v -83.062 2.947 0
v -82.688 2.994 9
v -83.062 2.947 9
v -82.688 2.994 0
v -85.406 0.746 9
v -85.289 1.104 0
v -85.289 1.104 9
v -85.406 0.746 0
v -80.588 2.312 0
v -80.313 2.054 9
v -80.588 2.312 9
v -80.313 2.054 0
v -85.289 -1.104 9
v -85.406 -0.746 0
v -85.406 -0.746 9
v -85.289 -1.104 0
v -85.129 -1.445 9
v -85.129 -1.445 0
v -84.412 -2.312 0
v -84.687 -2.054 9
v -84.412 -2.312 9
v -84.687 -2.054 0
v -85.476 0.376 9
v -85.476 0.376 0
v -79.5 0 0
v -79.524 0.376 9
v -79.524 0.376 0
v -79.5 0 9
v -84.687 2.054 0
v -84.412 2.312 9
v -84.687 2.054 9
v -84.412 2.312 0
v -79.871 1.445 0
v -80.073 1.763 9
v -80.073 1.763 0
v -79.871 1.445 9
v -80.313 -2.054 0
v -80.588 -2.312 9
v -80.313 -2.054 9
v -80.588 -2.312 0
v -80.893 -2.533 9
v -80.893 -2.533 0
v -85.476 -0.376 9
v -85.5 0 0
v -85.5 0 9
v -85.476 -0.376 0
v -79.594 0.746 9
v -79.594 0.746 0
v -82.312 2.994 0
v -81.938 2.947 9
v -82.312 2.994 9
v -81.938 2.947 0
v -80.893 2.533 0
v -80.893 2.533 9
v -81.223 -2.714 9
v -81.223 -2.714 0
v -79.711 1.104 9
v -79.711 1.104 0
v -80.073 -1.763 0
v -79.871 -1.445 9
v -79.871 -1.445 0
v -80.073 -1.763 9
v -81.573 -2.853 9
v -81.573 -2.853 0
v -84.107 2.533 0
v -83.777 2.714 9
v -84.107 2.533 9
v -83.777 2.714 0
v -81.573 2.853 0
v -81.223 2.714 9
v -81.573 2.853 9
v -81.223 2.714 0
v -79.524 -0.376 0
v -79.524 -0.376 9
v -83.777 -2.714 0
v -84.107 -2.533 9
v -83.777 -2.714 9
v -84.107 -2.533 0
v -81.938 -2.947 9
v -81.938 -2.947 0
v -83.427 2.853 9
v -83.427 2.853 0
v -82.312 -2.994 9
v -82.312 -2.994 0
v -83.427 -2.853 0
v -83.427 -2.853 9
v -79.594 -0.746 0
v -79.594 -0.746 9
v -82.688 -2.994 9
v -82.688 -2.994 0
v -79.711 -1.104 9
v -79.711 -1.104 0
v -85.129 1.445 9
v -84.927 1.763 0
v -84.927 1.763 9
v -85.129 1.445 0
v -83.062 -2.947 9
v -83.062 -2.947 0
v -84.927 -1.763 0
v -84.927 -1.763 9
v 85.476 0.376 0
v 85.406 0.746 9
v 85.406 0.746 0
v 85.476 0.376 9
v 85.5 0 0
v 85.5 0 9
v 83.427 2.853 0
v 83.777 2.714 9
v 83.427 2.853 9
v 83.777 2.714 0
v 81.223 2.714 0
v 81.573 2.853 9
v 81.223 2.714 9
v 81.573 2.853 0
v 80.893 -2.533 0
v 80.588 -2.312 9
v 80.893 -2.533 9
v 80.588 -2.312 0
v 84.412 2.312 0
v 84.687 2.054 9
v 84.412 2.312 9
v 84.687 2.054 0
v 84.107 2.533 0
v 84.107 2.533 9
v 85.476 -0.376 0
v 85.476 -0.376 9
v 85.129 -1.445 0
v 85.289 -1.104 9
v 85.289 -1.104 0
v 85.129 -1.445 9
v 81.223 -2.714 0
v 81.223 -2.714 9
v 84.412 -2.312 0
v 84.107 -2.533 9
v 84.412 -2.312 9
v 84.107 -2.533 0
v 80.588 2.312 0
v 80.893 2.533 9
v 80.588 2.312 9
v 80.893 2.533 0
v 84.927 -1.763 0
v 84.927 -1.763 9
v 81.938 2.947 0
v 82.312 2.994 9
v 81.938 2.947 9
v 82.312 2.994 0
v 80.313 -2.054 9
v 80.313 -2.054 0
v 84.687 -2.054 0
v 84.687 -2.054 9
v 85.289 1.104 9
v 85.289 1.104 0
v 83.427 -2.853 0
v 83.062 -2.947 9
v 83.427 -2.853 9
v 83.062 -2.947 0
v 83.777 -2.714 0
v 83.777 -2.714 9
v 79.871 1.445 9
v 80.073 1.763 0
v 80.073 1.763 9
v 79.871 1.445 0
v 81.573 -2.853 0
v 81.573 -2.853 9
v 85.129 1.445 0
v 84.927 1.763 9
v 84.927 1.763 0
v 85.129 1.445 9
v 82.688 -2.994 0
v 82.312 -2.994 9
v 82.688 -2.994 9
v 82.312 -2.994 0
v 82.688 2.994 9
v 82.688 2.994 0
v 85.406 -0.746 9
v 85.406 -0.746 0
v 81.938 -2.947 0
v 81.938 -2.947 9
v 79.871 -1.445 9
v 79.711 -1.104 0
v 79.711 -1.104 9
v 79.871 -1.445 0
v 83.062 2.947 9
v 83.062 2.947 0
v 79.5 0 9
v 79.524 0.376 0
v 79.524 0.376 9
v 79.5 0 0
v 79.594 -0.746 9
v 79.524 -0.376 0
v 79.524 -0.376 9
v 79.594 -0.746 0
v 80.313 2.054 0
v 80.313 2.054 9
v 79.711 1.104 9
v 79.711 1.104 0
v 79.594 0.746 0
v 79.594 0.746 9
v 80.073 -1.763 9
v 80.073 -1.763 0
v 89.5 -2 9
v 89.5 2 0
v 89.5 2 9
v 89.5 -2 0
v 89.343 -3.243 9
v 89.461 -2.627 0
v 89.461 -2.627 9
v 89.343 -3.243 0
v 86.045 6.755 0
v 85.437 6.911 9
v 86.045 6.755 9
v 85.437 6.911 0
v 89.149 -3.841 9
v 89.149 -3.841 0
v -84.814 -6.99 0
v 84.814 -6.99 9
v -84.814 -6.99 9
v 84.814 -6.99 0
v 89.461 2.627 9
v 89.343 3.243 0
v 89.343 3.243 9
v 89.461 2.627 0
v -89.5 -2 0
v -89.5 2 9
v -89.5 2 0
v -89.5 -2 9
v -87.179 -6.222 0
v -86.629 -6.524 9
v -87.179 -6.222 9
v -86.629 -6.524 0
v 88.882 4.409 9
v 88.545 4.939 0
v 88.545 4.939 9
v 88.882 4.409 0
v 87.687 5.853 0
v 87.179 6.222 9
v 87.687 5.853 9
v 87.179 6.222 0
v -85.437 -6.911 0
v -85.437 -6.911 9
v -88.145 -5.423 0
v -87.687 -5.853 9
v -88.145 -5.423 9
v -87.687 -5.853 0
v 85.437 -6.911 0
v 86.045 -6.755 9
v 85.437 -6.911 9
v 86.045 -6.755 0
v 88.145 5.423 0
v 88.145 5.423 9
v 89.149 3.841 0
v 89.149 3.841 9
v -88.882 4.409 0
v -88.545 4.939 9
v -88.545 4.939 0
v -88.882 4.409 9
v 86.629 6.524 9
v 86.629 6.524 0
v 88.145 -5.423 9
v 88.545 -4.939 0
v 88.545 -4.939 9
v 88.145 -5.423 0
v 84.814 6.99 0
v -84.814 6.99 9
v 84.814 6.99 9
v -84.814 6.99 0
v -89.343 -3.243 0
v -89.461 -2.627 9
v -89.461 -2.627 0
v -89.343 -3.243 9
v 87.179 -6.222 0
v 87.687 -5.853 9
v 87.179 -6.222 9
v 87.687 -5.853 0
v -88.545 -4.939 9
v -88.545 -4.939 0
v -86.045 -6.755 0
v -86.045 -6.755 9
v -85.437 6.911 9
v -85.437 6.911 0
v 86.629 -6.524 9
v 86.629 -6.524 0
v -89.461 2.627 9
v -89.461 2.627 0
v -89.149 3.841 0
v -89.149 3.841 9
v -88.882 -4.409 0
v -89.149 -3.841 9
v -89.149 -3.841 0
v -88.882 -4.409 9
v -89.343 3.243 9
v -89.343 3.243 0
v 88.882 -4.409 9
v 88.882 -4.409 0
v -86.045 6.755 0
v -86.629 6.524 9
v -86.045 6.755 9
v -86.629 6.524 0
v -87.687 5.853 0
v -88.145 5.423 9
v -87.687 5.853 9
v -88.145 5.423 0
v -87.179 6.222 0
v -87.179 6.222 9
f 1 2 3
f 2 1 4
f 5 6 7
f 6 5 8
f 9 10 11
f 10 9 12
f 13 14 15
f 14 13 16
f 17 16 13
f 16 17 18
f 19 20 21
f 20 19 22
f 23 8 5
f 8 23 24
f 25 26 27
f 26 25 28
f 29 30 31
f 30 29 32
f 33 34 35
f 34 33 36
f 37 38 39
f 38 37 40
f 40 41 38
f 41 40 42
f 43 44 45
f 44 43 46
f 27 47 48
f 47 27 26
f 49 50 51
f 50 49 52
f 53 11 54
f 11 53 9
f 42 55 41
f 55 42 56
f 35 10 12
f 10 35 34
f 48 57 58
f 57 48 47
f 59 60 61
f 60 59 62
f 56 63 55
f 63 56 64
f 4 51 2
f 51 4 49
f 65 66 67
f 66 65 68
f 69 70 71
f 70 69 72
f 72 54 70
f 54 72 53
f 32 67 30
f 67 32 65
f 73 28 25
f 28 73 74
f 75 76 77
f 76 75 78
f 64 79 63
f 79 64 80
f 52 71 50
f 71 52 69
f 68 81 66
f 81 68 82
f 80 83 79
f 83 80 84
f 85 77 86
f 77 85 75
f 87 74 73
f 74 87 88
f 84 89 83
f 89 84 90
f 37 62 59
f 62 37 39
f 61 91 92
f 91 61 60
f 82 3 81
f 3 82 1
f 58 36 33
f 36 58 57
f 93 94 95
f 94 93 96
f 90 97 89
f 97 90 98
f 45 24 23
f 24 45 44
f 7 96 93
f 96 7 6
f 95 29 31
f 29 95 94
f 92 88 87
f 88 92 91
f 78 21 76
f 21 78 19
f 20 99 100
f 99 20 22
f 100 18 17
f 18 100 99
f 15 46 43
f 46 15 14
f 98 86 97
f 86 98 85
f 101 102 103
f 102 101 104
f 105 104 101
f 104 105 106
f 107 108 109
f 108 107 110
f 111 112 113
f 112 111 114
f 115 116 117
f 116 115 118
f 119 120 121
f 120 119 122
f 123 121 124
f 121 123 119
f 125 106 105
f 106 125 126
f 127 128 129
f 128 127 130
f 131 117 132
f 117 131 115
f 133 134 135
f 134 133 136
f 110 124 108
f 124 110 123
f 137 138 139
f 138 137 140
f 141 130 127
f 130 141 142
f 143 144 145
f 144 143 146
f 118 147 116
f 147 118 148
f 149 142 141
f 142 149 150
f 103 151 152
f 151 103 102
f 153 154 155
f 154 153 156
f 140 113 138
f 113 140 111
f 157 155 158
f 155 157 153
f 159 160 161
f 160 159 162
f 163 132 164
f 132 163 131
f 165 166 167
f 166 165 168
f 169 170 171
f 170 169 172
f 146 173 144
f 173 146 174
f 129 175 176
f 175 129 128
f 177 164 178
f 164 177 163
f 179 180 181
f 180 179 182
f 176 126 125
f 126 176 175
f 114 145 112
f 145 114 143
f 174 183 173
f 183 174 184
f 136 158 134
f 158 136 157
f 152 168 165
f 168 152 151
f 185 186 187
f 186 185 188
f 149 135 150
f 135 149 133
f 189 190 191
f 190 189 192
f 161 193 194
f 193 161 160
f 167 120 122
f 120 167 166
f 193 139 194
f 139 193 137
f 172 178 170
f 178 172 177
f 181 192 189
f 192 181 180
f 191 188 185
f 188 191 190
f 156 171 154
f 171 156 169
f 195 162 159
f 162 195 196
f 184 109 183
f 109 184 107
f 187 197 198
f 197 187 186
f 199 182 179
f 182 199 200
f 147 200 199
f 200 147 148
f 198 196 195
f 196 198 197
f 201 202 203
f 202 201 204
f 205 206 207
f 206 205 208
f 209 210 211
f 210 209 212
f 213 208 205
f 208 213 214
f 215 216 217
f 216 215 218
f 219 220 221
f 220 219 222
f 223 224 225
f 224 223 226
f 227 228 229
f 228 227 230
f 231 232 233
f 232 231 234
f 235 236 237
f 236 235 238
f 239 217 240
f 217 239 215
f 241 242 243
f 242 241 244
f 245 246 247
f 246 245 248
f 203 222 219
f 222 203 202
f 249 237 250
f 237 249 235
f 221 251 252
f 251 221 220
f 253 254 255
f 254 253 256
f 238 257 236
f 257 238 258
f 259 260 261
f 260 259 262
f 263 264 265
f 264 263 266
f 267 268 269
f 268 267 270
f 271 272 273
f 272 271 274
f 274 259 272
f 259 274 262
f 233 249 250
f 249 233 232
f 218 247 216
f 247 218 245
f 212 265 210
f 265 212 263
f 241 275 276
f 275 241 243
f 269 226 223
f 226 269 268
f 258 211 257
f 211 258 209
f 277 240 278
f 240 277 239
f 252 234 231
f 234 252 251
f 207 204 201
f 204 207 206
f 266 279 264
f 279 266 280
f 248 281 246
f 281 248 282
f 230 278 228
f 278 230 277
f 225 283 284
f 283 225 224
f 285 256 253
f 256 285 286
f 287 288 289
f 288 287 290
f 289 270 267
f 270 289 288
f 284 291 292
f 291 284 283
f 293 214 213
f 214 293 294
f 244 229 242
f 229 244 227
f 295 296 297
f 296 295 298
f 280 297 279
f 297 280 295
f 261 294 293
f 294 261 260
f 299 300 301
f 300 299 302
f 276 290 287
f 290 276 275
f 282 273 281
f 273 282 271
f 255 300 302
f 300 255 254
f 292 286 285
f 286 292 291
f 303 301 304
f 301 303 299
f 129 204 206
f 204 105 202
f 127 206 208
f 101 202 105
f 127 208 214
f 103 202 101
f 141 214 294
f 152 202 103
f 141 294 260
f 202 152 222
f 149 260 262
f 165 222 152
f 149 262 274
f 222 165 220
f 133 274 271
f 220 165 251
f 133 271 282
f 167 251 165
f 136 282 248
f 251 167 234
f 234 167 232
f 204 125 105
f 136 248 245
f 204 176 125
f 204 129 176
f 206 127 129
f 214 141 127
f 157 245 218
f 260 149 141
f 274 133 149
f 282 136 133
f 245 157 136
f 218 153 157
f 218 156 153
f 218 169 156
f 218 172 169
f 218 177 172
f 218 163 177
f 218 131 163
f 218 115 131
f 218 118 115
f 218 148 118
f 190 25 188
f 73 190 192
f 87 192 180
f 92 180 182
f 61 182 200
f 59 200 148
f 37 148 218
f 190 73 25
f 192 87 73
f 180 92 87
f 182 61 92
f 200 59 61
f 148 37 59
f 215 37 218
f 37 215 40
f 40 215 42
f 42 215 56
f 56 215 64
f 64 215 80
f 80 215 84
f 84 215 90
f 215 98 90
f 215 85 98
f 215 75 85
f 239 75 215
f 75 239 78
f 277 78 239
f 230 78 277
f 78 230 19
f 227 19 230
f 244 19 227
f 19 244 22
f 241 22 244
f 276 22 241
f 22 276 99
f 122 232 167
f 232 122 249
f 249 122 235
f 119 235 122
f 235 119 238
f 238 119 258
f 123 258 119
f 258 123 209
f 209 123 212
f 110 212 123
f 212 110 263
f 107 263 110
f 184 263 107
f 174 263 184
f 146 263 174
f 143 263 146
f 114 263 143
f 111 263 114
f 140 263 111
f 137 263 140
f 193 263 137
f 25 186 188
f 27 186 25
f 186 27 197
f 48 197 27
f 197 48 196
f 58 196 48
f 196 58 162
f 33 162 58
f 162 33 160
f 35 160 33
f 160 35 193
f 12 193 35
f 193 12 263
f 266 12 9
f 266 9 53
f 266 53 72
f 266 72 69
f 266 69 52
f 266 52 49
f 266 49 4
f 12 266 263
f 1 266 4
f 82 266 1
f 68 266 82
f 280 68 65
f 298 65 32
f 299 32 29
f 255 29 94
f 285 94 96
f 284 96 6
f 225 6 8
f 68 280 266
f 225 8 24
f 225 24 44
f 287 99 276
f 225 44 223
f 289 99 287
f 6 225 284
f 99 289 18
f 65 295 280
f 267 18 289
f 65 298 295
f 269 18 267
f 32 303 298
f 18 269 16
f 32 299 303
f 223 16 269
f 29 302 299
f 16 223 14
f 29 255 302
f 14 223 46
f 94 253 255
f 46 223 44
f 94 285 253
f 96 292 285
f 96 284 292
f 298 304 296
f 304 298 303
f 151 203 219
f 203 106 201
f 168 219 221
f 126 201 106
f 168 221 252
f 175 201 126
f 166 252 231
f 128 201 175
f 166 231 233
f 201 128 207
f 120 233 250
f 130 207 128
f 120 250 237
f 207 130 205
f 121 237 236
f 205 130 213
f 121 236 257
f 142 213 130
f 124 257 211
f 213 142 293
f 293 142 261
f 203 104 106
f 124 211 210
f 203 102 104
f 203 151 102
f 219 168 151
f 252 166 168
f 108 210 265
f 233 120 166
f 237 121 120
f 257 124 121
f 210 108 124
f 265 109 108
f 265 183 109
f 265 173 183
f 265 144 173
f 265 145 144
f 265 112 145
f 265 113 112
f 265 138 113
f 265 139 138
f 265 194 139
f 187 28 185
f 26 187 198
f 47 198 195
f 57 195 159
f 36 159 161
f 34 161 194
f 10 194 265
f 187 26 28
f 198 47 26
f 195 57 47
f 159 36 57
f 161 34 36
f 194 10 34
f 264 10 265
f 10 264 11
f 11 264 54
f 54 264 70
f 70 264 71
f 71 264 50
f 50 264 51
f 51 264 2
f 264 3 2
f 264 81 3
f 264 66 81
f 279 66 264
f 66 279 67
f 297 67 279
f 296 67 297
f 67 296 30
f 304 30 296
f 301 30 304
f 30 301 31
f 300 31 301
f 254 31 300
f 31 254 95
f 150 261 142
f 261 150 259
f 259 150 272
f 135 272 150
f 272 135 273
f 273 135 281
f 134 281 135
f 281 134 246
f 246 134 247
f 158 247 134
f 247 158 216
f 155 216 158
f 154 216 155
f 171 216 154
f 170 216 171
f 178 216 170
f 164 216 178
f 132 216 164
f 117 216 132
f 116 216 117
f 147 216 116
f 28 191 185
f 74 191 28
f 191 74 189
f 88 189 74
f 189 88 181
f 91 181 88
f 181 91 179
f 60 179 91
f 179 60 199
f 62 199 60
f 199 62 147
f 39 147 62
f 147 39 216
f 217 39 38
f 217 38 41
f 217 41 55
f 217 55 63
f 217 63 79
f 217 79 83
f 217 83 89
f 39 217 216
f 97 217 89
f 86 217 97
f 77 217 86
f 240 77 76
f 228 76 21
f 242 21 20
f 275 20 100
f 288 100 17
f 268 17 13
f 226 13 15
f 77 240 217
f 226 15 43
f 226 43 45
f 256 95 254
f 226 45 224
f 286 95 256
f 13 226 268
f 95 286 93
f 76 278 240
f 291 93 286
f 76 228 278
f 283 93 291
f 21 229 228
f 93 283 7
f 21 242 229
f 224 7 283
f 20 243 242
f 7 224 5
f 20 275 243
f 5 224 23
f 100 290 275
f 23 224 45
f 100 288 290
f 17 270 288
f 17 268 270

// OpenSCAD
$fn = 50;


difference() {
	union() {
		hull() {
			translate(v = [-84.5000000000, 2.0000000000, 0]) {
				cylinder(h = 9, r = 5);
			}
			translate(v = [84.5000000000, 2.0000000000, 0]) {
				cylinder(h = 9, r = 5);
			}
			translate(v = [-84.5000000000, -2.0000000000, 0]) {
				cylinder(h = 9, r = 5);
			}
			translate(v = [84.5000000000, -2.0000000000, 0]) {
				cylinder(h = 9, r = 5);
			}
		}
	}
	union() {
		translate(v = [-82.5000000000, 0.0000000000, -100.0000000000]) {
			cylinder(h = 200, r = 3.0000000000);
		}
		translate(v = [-82.5000000000, 0.0000000000, -100.0000000000]) {
			cylinder(h = 200, r = 3.0000000000);
		}
		translate(v = [82.5000000000, 0.0000000000, -100.0000000000]) {
			cylinder(h = 200, r = 3.0000000000);
		}
		translate(v = [82.5000000000, 0.0000000000, -100.0000000000]) {
			cylinder(h = 200, r = 3.0000000000);
		}
	}
}
